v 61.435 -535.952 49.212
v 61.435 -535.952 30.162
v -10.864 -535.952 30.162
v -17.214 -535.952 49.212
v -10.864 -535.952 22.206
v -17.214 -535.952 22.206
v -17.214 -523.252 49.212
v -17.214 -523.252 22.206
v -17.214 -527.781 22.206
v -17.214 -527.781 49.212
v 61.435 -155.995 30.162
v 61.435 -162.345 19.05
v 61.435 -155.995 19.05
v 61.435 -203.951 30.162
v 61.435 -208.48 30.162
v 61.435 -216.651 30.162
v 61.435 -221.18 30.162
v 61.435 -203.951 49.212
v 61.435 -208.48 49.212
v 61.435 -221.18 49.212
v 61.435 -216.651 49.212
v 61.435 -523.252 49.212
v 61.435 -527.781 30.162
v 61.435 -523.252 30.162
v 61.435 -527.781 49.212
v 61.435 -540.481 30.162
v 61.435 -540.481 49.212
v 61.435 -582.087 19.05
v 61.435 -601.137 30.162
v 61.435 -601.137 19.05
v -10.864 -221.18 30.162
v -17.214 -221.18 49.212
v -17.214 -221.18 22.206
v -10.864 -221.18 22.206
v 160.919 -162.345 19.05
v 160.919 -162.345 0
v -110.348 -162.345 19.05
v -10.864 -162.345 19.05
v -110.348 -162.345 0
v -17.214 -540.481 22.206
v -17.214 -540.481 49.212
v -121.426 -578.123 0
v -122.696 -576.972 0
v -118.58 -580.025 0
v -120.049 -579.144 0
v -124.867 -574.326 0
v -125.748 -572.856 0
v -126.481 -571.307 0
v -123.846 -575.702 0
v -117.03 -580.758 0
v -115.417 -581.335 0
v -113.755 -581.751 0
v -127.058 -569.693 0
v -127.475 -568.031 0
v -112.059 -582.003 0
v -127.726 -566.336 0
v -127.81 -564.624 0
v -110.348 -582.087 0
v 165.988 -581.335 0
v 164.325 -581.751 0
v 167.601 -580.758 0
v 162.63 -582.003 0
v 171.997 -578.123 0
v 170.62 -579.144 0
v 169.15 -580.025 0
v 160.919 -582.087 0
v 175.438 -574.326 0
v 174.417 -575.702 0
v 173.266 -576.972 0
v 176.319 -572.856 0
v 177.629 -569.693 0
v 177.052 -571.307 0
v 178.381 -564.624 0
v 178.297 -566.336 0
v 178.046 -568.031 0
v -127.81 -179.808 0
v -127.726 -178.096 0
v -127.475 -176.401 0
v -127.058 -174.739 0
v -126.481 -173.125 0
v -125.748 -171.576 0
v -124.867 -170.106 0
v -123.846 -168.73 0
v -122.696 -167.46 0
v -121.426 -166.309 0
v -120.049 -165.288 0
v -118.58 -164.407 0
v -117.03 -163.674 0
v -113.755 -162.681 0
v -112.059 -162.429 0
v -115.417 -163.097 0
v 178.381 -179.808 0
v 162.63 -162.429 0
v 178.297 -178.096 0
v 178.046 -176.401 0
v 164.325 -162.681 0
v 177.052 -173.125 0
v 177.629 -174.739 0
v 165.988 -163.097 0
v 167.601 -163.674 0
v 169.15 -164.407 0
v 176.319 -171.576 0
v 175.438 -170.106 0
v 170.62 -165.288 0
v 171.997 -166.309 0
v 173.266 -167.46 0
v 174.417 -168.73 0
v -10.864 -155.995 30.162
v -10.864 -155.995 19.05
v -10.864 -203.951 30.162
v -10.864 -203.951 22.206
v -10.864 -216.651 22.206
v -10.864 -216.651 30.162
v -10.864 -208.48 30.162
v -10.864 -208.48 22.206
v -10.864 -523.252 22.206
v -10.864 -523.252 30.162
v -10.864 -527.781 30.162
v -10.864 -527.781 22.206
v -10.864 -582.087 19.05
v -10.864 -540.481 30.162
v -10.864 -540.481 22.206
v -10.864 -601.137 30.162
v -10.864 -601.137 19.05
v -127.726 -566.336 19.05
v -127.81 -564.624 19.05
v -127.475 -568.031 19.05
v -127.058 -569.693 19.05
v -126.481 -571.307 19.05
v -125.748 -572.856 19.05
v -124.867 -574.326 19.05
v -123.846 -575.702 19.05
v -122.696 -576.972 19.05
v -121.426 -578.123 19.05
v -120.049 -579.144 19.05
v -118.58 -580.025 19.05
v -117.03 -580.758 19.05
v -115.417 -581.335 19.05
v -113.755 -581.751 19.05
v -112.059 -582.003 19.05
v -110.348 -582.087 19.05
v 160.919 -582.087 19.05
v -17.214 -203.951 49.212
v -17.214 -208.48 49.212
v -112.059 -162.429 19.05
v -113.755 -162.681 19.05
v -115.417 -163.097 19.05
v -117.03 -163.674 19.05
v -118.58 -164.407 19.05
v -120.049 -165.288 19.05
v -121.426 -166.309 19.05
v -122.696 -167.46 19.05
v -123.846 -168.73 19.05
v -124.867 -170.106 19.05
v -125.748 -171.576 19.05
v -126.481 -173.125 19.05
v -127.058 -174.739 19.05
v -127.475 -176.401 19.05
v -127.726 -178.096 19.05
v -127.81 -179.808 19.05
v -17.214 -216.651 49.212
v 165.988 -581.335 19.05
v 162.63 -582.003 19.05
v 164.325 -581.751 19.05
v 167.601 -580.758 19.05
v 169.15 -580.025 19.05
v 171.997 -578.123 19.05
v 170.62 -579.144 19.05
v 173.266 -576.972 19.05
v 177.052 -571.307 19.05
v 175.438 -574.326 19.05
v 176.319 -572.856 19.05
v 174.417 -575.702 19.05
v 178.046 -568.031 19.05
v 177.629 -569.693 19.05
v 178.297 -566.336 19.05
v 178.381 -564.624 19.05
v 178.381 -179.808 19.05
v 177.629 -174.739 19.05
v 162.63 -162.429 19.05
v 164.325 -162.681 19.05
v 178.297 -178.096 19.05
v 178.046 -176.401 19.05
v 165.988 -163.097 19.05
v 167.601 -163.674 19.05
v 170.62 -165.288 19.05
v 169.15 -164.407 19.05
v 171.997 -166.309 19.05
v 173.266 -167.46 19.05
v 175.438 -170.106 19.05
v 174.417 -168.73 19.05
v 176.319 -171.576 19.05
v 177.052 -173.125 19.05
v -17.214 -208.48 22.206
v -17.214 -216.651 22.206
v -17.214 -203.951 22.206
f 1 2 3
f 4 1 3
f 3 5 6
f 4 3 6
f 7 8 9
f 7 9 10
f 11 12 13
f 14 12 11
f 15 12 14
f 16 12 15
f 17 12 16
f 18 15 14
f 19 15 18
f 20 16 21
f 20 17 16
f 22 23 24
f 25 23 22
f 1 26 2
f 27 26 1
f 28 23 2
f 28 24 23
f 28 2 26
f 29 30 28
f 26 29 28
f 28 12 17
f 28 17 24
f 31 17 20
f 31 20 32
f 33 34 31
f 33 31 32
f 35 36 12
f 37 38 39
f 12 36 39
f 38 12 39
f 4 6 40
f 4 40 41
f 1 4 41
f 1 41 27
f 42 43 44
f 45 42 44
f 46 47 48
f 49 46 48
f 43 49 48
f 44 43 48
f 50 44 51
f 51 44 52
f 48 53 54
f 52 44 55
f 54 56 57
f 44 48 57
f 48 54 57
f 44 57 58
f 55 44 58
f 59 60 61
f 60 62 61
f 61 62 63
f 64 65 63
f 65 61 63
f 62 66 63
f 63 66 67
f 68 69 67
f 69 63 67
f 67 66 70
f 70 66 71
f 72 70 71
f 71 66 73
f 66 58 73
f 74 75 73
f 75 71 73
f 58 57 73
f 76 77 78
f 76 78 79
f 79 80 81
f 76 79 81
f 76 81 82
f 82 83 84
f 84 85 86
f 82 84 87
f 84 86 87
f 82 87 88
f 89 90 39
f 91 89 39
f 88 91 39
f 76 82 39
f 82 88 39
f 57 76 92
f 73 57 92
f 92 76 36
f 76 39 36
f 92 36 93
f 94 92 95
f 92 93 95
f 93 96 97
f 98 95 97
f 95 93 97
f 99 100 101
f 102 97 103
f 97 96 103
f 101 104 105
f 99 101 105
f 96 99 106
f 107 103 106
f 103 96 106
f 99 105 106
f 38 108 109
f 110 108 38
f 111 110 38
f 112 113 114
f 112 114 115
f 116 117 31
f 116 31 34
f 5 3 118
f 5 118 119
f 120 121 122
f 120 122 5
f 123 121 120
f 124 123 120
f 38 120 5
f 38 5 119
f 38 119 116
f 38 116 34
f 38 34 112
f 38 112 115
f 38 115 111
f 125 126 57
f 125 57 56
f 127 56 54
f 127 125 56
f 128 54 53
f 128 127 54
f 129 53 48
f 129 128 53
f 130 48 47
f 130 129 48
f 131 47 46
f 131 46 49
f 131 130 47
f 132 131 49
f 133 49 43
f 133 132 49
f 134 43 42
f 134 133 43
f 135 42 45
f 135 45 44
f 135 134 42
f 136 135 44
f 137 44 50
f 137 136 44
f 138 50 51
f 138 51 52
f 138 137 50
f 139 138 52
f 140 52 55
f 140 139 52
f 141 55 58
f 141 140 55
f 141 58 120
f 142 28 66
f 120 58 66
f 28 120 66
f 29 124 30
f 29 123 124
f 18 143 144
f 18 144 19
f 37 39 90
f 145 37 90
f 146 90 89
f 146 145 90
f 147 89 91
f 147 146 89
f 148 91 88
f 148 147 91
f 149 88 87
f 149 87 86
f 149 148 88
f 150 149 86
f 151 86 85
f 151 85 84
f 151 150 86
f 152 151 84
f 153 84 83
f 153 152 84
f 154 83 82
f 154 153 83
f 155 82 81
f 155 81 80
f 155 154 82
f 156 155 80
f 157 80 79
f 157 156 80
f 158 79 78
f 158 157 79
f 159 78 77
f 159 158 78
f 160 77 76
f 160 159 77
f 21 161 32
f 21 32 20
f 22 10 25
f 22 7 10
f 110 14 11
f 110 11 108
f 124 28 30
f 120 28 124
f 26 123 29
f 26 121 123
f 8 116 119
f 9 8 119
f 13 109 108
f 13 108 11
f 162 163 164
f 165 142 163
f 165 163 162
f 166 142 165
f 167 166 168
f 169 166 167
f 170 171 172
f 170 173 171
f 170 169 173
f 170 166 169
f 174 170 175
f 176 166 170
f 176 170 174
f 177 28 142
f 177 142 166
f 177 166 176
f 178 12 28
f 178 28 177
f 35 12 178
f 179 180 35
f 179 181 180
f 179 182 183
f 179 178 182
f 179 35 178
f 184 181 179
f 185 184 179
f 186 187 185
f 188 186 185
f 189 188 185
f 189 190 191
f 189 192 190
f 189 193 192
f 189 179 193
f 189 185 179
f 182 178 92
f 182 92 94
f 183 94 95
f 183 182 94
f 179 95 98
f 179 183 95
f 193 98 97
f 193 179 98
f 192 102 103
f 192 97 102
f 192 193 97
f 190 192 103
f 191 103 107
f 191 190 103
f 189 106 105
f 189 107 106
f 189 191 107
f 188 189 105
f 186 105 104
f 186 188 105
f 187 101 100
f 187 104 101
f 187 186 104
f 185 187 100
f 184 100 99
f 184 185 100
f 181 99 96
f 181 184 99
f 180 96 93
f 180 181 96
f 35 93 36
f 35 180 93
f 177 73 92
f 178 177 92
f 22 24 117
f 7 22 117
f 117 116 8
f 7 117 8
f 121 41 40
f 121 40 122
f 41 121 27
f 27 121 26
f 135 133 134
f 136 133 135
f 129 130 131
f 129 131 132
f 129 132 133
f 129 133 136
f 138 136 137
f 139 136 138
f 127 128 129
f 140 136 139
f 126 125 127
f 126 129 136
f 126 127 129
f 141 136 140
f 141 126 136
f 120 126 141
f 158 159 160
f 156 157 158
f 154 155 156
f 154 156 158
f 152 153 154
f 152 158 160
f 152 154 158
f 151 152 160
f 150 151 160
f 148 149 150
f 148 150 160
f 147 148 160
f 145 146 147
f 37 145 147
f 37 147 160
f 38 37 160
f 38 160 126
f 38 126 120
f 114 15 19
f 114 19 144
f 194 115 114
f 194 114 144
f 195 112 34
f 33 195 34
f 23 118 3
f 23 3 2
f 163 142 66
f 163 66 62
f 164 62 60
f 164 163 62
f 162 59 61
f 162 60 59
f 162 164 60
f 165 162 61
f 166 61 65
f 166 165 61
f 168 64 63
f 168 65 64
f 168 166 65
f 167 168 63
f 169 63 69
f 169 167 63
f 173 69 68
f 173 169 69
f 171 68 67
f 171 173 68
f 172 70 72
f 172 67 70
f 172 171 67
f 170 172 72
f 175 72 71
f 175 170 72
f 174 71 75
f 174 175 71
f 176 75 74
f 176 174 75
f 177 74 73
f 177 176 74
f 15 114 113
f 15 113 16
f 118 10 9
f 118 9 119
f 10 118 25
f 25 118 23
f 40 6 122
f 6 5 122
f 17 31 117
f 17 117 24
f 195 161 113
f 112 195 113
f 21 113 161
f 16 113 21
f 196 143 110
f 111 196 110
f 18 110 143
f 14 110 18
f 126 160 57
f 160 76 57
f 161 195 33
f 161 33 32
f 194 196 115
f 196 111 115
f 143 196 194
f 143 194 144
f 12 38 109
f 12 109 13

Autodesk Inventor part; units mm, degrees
ref_plane "YZ Plane" through (0, 0, 0) normal (1, 0, 0) x (0, 1, 0)
ref_plane "XZ Plane" through (0, 0, 0) normal (0, 1, 0) x (-1, 0, 0)
ref_plane "XY Plane" through (0, 0, 0) normal (0, 0, 1) x (1, 0, 0)
sketch "Sketch1" plane through (0, 0, 0) normal (0, 0, 1) x (1, 0, 0)
  line L0 (178.3811, -162.3451) -> (-127.8103, -162.3451)
  line L1 (-127.8103, -162.3451) -> (-127.8103, -582.0869)
  line L2 (-127.8103, -582.0869) -> (178.3811, -582.0869)
  line L3 (178.3811, -582.0869) -> (178.3811, -162.3451)
  circle A0 centre (25.2854, -372.216) radius 2.2409 projected
  line L4 (178.3811, -162.3451) -> (-127.8103, -582.0869)
  line L5 (178.3811, -582.0869) -> (-127.8103, -162.3451)
  point P0 (0, 0)
extrude "Extrusion1" add sketch "Sketch1" along normal blind 19.05
sketch "Sketch2" plane through (0, 0, 19.05) normal (0, 0, 1) x (1, 0, 0)
  line L0 (178.3811, -582.0869) -> (-127.8103, -582.0869) projected
  line L1 (-127.8103, -162.3451) -> (178.3811, -162.3451) projected
  line L2 (-10.8645, -162.3451) -> (-10.8645, -582.0869)
  circle A0 centre (25.2854, -372.216) radius 4.386 projected
  line L3 (61.4353, -582.0869) -> (61.4353, -162.3451)
  line L4 (-10.8645, -162.3451) -> (61.4353, -582.0869)
  line L5 (61.4353, -162.3451) -> (-10.8645, -582.0869)
  line L6 (-10.8645, -162.3451) -> (61.4353, -162.3451)
  line L7 (61.4353, -582.0869) -> (-10.8645, -582.0869)
  point P0 (0, 0)
  point P1 (25.2854, -372.216)
extrude "Extrusion2" add sketch "Sketch2" along normal blind 11.1125
sketch "Sketch3" plane through (0, 0, 30.1625) normal (0, 0, 1) x (1, 0, 0)
  line L0 (-10.8645, -582.0869) -> (-10.8645, -162.3451) projected
  line L1 (61.4353, -162.3451) -> (61.4353, -582.0869) projected
  circle A0 centre (25.2854, -372.216) radius 4.386 projected
  line L2 (-10.8645, -203.9512) -> (61.4353, -203.9512)
  line L3 (61.4353, -203.9512) -> (61.4353, -208.4802)
  line L4 (61.4353, -208.4802) -> (-10.8645, -208.4802)
  line L5 (-10.8645, -208.4802) -> (-10.8645, -203.9512)
  line L6 (-10.8645, -216.6512) -> (61.4353, -216.6512)
  line L7 (61.4353, -216.6512) -> (61.4353, -221.1802)
  line L8 (61.4353, -221.1802) -> (-10.8645, -221.1802)
  line L9 (-10.8645, -221.1802) -> (-10.8645, -216.6512)
  line L10 (25.2854, -372.216) -> (-128.4851, -372.216) construction
  line L11 (-10.8645, -540.4809) -> (61.4353, -540.4809)
  line L12 (61.4353, -540.4809) -> (61.4353, -535.9519)
  line L13 (61.4353, -535.9519) -> (-10.8645, -535.9519)
  line L14 (-10.8645, -535.9519) -> (-10.8645, -540.4809)
  line L15 (61.4353, -527.7809) -> (61.4353, -523.2519)
  line L16 (-10.8645, -523.2519) -> (-10.8645, -527.7809)
  line L17 (-10.8645, -527.7809) -> (61.4353, -527.7809)
  line L18 (61.4353, -523.2519) -> (-10.8645, -523.2519)
  point P0 (0, 0)
  dimension "d6" = 12.7
extrude "Extrusion3" add sketch "Sketch3" along normal blind 19.05 contours L0 L13 L1 L11 | L0 L18 L1 L17 | L0 L6 L1 L8 | L0 L2 L1 L4
fillet "Fillet1" radius 17.4625 4 edges at (-127.8103, -582.0869, 9.525) (-127.8103, -162.3451, 9.525) (178.3811, -582.0869, 9.525) (178.3811, -162.3451, 9.525)
sketch "Sketch4" plane through (-10.8645, -582.0869, 19.05) normal (-1, 0, 0) x (0, 0, 1)
  line L0 (11.1125, 0) -> (11.1125, 41.606) projected
  line L1 (11.1125, 41.606) -> (30.1625, 41.606) projected
  line L2 (30.1625, 41.606) -> (30.1625, 46.135) projected
  line L3 (11.1125, 46.135) -> (30.1625, 46.135) projected
  line L4 (11.1125, 54.306) -> (30.1625, 54.306) projected
  line L5 (30.1625, 54.306) -> (30.1625, 58.835) projected
  line L6 (11.1125, 58.835) -> (30.1625, 58.835) projected
  line L7 (11.1125, 58.835) -> (11.1125, 360.9067) projected
  line L8 (11.1125, 360.9067) -> (30.1625, 360.9067) projected
  line L9 (30.1625, 360.9067) -> (30.1625, 365.4357) projected
  line L10 (11.1125, 365.4357) -> (30.1625, 365.4357) projected
  line L11 (11.1125, 373.6067) -> (30.1625, 373.6067) projected
  line L12 (30.1625, 373.6067) -> (30.1625, 378.1357) projected
  line L13 (11.1125, 378.1357) -> (30.1625, 378.1357) projected
  line L14 (0, 0) -> (0, 419.7418) projected
  line L15 (0, 0) -> (11.1125, 0) projected
  line L16 (11.1125, 378.1357) -> (3.1565, 378.1357)
  line L17 (3.1565, 378.1357) -> (3.1565, 373.6067)
  line L18 (3.1565, 373.6067) -> (11.1125, 373.6067)
  line L19 (11.1125, 365.4357) -> (3.1565, 365.4357)
  line L20 (3.1565, 365.4357) -> (3.1565, 360.9067)
  line L21 (3.1565, 360.9067) -> (11.1125, 360.9067)
  line L22 (11.1125, 58.835) -> (3.1565, 58.835)
  line L23 (3.1565, 58.835) -> (3.1565, 54.306)
  line L24 (3.1565, 54.306) -> (11.1125, 54.306)
  line L25 (11.1125, 46.135) -> (3.1565, 46.135)
  line L26 (3.1565, 46.135) -> (3.1565, 41.606)
  line L27 (3.1565, 41.606) -> (11.1125, 41.606)
  point P0 (-19.05, 582.0869)
extrude "Extrusion4" add sketch "Sketch4" along normal blind 6.35
sketch "Sketch5" plane through (-10.8645, -582.0869, 30.1625) normal (0, -1, 0) x (1, 0, 0)
  line L0 (0, 0) -> (72.2998, 0)
  line L1 (72.2998, 0) -> (72.2998, -11.1125)
  line L2 (72.2998, -11.1125) -> (0, -11.1125)
  line L3 (0, -11.1125) -> (0, 0)
  point P0 (10.8645, -30.1625)
extrude "Extrusion5" add sketch "Sketch5" along normal blind 19.05
sketch "Sketch6" plane through (-10.8645, -162.3451, 30.1625) normal (0, 1, 0) x (1, 0, 0)
  line L0 (0, 11.1125) -> (72.2998, 11.1125)
  line L1 (72.2998, 11.1125) -> (72.2998, 0)
  line L2 (72.2998, 0) -> (0, 0)
  line L3 (0, 0) -> (0, 11.1125)
  point P0 (10.8645, 30.1625)
extrude "Extrusion6" add sketch "Sketch6" along normal blind 6.35
properties part number "Ruler"
